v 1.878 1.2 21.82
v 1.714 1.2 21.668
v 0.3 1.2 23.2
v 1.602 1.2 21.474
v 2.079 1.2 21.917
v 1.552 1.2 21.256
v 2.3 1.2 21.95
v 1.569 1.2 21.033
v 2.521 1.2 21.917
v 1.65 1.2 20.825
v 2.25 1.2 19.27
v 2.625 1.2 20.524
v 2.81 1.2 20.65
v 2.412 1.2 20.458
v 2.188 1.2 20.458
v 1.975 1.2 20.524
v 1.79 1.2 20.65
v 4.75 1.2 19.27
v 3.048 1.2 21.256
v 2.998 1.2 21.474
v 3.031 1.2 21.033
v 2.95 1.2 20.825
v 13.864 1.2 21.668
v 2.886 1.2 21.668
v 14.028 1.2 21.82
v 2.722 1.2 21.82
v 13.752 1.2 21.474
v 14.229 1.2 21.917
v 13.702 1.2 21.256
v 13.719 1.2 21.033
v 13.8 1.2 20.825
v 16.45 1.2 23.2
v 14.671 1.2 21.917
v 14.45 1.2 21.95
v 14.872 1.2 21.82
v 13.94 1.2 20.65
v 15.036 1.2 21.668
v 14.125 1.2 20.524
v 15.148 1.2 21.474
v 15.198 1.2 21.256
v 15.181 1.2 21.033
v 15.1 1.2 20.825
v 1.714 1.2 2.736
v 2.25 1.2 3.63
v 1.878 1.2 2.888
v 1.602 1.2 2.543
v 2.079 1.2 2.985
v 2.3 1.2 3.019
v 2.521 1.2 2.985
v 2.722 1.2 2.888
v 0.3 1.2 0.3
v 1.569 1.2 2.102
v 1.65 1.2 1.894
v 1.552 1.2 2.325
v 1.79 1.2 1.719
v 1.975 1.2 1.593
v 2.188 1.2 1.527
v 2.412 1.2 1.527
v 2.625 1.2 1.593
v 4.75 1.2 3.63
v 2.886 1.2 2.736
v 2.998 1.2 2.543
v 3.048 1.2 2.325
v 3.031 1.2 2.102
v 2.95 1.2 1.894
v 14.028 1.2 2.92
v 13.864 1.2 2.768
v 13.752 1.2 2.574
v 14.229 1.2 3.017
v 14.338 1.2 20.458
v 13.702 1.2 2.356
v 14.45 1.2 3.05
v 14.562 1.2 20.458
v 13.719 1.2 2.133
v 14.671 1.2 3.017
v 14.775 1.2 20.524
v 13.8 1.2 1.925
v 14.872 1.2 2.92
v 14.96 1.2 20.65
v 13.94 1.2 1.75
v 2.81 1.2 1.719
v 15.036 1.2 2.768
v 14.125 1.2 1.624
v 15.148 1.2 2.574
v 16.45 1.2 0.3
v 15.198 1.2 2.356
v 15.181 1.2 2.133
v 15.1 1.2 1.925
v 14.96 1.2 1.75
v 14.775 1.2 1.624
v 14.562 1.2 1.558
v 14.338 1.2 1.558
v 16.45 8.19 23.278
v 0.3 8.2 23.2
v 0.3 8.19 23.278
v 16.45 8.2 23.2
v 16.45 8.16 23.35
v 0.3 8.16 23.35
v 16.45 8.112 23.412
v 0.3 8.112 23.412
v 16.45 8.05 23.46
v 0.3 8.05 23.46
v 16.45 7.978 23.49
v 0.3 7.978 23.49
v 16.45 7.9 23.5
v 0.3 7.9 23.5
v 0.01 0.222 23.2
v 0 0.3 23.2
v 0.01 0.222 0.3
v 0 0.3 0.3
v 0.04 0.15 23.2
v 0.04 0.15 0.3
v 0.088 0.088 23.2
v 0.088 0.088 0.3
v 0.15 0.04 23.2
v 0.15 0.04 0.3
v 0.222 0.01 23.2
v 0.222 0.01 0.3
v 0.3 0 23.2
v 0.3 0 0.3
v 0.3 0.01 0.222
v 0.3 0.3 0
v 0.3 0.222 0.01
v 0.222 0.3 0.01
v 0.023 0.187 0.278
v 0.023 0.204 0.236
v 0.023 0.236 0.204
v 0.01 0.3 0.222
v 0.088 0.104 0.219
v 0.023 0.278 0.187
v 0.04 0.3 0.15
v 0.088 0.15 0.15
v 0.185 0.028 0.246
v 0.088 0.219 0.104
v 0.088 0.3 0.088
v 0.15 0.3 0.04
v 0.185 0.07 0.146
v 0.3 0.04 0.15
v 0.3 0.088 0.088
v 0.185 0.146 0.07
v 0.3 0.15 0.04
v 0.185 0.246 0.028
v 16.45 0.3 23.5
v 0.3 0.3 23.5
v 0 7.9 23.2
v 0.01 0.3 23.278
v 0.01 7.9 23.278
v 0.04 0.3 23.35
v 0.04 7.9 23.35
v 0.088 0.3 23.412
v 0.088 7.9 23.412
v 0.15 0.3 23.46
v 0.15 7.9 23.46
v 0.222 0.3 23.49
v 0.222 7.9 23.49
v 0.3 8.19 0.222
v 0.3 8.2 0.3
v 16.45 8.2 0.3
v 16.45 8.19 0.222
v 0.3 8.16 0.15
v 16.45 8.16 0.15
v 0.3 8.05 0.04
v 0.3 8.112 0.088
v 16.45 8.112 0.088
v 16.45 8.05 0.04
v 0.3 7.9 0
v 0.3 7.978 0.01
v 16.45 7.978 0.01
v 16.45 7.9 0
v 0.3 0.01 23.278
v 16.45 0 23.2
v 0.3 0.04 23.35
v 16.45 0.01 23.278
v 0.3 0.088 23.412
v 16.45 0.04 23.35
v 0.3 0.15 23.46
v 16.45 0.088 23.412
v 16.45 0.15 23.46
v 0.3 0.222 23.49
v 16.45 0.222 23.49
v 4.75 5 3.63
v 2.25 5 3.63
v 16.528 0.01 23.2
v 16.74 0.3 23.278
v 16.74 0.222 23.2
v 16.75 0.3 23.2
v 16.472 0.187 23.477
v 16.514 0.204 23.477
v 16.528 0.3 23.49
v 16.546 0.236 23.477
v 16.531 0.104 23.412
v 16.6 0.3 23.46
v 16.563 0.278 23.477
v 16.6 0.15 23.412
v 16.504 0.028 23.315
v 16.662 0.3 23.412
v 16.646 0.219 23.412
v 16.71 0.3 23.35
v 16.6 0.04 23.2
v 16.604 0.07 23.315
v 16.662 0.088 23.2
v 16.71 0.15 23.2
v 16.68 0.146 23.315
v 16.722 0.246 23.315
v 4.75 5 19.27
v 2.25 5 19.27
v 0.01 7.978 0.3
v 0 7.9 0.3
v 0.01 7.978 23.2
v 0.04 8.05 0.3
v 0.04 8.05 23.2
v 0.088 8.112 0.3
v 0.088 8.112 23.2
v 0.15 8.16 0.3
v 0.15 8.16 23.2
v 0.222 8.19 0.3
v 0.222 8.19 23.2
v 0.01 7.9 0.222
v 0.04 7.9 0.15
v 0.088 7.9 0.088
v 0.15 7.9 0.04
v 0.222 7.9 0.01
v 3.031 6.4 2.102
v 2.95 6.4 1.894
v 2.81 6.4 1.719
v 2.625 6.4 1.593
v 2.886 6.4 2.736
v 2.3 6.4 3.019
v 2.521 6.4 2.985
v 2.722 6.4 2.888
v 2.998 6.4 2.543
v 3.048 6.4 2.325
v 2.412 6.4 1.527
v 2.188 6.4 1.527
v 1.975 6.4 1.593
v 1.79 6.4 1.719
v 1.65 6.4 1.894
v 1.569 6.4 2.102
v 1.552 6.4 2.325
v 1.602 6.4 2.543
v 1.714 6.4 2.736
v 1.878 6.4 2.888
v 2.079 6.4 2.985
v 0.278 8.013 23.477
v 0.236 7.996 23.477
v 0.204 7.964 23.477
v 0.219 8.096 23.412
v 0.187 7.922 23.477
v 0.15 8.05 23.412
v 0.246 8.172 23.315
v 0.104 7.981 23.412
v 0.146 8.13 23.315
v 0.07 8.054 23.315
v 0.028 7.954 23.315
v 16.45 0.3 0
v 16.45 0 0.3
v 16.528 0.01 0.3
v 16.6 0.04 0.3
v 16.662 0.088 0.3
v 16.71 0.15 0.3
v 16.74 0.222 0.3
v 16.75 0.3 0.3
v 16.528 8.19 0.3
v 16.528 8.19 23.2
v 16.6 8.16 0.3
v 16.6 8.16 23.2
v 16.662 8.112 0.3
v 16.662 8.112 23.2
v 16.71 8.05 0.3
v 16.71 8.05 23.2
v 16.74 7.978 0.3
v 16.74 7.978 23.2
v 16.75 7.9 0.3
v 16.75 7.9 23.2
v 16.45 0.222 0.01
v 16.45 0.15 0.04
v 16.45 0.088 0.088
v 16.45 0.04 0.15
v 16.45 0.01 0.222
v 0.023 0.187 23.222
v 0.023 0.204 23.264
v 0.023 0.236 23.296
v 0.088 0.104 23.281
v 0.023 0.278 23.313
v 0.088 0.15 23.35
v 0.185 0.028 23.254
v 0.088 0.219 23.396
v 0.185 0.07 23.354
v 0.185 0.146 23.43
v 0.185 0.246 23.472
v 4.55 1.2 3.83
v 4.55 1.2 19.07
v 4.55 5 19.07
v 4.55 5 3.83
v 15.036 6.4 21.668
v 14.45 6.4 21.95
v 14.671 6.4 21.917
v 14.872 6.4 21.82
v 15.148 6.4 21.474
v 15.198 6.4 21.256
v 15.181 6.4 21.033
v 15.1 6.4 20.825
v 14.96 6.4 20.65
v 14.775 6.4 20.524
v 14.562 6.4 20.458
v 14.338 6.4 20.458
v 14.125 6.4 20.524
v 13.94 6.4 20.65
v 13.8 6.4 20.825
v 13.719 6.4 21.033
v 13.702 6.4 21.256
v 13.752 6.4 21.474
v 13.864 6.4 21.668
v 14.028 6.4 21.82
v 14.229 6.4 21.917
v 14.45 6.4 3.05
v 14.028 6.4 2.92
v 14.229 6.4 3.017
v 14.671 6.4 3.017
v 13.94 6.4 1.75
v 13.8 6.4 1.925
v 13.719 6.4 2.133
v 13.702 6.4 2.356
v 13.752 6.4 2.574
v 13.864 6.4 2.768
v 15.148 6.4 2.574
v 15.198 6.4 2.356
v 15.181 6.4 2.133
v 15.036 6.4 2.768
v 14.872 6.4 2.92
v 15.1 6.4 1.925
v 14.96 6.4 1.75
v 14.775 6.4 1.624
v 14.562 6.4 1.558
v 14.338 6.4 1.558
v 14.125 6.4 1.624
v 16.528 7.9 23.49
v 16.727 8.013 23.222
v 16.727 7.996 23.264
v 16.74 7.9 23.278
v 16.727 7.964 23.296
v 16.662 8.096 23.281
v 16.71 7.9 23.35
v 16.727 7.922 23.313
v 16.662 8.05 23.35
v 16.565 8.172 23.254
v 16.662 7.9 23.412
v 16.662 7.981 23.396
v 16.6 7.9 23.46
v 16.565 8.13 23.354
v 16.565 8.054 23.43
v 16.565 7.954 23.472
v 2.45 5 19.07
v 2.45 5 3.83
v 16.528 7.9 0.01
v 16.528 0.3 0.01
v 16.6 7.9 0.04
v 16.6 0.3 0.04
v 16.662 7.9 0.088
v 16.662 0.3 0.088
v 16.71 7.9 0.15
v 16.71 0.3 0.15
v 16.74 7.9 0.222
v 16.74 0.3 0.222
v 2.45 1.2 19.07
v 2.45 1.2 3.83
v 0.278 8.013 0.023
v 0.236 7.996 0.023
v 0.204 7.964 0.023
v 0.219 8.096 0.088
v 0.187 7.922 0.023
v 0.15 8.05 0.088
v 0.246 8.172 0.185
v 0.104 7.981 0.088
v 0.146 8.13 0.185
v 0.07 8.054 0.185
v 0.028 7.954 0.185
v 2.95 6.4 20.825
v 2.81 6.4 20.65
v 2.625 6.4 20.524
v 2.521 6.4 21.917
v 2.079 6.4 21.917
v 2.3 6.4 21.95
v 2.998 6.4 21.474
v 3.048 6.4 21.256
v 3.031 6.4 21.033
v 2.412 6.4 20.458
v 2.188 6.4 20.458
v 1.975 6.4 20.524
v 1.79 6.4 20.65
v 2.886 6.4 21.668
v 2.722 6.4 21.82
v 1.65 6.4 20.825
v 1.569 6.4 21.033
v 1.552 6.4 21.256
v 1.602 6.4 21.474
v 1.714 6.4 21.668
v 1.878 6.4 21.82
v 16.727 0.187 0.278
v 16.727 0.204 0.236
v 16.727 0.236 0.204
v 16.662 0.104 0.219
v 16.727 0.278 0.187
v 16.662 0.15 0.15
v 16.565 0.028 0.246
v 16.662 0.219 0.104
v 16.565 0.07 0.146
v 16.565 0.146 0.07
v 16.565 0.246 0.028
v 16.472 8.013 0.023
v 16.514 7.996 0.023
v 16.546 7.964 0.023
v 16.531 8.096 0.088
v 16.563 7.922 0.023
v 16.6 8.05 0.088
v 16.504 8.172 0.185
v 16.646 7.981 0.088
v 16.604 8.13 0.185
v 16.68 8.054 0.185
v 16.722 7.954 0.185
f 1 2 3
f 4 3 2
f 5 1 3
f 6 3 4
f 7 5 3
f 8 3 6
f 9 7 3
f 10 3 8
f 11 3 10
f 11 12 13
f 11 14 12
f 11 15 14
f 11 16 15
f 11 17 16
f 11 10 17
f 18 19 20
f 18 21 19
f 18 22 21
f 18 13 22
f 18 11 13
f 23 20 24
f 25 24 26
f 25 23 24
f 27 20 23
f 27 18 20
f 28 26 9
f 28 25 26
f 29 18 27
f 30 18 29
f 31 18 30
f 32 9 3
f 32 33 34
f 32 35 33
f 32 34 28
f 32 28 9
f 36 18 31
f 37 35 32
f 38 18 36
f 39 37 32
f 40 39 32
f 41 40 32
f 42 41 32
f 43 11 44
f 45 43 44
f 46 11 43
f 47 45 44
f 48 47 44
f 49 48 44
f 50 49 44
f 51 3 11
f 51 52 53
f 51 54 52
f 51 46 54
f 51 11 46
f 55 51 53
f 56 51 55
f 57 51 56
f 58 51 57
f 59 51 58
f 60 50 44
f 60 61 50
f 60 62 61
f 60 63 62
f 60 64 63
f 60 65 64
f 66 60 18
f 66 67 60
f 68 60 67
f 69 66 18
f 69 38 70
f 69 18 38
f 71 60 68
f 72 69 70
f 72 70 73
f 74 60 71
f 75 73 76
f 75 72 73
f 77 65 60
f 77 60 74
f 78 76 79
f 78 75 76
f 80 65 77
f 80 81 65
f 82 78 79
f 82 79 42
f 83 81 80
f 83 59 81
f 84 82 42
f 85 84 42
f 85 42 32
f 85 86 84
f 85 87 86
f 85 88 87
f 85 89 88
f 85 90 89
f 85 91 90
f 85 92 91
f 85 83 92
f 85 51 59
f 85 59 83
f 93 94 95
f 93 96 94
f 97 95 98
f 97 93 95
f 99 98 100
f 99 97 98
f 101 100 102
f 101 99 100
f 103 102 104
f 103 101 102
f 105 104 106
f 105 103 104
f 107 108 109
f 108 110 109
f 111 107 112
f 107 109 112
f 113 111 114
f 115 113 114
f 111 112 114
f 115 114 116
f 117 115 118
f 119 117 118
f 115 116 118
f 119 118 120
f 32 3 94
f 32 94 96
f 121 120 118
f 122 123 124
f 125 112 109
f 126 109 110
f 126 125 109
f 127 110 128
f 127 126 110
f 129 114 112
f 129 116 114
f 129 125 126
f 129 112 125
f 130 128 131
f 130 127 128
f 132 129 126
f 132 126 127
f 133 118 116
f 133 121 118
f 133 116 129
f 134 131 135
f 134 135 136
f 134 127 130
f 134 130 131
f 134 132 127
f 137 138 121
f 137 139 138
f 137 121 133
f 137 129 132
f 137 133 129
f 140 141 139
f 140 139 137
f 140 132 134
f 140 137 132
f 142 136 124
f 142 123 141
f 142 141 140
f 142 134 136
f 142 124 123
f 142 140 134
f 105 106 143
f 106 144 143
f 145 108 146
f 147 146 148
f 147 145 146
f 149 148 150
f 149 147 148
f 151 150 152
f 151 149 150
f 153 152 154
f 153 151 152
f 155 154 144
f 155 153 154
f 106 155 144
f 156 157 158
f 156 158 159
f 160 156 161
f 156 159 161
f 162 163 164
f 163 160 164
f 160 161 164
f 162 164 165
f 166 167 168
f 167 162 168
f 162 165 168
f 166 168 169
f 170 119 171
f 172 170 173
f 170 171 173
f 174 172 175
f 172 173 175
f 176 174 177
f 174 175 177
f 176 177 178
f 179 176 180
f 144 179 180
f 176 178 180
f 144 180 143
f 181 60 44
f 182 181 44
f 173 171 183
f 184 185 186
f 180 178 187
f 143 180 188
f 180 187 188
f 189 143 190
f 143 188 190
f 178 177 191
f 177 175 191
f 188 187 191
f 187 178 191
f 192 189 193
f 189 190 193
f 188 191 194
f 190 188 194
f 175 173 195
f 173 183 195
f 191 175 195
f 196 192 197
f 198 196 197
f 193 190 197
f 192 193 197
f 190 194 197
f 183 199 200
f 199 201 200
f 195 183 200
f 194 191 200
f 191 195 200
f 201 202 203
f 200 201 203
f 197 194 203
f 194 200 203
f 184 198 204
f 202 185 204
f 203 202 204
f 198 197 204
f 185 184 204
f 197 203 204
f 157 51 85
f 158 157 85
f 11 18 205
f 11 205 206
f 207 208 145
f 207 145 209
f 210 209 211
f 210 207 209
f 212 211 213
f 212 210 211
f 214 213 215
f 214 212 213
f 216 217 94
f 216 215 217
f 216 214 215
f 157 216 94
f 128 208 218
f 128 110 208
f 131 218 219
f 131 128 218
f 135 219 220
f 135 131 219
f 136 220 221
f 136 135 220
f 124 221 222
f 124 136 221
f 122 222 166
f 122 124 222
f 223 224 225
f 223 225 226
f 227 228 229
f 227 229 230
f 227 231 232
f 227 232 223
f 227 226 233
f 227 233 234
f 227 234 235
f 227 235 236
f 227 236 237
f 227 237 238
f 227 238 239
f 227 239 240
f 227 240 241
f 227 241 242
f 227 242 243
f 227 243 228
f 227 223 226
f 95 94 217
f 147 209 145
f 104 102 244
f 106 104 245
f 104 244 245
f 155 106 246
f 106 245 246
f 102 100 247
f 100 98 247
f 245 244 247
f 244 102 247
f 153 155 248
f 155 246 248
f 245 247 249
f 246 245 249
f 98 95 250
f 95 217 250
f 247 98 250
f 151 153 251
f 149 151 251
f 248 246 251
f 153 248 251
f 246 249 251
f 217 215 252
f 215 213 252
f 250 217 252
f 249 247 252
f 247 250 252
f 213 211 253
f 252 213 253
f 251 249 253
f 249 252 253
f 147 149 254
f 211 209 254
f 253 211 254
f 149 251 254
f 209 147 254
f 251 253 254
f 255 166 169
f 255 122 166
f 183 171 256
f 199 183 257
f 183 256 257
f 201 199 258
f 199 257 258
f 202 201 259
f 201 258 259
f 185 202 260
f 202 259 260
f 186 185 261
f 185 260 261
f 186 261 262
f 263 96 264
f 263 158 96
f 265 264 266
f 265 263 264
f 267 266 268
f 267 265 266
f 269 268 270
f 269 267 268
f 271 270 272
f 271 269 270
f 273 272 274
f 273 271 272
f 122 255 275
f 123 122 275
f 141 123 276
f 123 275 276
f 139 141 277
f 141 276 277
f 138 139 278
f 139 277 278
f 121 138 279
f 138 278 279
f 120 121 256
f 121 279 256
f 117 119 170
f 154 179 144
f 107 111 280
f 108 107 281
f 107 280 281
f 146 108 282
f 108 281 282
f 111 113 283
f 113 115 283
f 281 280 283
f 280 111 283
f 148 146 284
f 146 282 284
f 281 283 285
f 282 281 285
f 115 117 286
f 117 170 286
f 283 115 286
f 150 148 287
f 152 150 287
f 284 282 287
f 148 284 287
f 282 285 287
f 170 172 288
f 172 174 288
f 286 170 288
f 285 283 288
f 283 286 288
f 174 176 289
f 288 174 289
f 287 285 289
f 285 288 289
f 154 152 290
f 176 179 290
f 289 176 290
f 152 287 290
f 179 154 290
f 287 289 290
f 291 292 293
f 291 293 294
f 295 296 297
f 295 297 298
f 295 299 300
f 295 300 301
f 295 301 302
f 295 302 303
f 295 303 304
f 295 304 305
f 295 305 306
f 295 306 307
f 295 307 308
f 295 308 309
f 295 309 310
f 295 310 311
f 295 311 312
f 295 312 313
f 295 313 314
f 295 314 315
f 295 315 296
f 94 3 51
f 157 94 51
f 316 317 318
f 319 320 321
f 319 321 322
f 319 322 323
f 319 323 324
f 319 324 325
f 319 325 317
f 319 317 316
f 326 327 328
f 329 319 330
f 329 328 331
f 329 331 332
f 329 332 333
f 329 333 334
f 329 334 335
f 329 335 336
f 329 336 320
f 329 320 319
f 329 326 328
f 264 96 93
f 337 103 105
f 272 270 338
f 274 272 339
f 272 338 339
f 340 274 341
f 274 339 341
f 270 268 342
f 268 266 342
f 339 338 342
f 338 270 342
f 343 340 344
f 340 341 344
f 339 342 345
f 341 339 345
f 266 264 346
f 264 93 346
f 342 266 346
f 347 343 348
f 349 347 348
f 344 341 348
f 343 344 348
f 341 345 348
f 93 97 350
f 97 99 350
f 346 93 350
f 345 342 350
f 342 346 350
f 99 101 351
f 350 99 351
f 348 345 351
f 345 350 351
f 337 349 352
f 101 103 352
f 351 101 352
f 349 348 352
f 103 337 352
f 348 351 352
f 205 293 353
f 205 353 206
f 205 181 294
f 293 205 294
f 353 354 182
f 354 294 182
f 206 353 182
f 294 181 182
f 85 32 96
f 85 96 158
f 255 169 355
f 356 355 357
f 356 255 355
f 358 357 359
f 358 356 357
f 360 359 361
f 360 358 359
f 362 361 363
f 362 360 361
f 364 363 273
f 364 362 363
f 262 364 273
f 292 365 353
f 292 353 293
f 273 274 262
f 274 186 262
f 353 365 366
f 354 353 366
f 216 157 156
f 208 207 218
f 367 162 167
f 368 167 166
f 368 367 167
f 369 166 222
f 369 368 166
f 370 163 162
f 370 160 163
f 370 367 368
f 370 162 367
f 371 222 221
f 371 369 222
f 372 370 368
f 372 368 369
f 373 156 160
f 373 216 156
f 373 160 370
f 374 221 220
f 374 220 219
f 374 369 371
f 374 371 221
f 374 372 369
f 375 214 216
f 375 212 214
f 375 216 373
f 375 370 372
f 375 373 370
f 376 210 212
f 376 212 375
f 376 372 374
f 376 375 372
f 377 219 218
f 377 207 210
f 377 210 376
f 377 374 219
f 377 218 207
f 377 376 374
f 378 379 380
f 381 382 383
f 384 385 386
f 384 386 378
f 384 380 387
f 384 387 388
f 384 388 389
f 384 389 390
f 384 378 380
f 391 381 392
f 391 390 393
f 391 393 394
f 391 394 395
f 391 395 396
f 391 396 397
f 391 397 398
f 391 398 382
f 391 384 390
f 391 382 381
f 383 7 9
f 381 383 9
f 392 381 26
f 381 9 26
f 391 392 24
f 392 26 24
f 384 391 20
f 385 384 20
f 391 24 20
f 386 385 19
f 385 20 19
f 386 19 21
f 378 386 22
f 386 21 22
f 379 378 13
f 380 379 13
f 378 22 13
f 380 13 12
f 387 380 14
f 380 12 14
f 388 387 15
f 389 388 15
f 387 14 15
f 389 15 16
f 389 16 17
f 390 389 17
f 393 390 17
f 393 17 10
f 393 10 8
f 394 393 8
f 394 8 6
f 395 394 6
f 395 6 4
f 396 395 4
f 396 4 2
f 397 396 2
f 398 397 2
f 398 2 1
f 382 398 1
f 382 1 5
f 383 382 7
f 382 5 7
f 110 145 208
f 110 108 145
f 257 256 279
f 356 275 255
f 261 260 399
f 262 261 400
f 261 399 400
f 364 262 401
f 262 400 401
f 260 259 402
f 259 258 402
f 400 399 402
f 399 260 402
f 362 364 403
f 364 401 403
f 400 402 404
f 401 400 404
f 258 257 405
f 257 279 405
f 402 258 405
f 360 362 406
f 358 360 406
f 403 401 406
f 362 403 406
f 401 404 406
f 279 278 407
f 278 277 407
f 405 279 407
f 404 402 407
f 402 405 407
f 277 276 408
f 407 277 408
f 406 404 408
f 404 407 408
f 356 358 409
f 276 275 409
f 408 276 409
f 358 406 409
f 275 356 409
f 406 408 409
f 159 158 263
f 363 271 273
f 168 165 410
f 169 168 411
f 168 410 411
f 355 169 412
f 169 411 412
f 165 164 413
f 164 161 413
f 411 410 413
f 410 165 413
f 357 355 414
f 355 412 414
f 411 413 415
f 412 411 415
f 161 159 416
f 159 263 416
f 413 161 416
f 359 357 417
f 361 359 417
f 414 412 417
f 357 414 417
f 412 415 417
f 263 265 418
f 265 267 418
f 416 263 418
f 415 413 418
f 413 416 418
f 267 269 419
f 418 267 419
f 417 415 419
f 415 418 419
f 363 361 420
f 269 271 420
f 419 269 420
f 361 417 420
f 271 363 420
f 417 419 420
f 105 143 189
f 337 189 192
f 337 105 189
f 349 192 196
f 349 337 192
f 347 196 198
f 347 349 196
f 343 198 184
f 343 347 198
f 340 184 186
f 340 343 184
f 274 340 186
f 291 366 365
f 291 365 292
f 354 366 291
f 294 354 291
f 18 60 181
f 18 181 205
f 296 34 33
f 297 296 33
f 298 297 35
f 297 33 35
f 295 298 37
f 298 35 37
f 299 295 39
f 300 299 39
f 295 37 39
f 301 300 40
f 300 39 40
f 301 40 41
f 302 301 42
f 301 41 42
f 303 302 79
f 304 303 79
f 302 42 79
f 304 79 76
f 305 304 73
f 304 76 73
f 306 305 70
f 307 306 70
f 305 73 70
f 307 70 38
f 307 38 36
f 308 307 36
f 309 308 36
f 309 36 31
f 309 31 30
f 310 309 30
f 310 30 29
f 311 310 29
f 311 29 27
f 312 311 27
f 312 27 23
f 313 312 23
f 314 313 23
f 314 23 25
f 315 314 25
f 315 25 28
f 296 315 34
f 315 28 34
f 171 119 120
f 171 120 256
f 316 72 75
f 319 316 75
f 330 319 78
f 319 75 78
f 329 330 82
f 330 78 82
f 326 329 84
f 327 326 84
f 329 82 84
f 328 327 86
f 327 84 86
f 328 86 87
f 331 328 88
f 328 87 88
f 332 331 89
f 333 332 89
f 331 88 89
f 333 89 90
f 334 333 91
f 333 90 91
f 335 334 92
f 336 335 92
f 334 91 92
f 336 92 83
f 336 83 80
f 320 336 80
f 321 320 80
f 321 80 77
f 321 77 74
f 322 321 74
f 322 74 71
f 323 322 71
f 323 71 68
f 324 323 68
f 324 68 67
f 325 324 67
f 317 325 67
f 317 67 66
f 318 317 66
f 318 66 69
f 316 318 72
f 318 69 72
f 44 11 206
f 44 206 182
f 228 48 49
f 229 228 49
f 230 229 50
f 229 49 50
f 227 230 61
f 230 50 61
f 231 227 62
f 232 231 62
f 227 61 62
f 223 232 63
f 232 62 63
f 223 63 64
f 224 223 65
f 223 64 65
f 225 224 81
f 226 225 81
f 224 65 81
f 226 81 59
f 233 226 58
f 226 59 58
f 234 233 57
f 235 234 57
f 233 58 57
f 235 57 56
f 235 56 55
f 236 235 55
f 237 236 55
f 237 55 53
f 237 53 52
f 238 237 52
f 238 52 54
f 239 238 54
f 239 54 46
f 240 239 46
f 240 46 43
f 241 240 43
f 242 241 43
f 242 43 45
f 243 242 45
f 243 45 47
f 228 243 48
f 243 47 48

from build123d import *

# Parameters (mm, degrees)
SKETCH1_W           = 16.75
SKETCH1_H           = 23.5
BOSS_EXTRUDE1_DEPTH = 1.2
SKETCH3_R           = 0.75
BOSS_EXTRUDE2_DEPTH = 5.2
SKETCH5_W           = 16.75
SKETCH5_H           = 23.5
SKETCH5_W_2         = 16.15
SKETCH5_H_2         = 22.9
BOSS_EXTRUDE3_DEPTH = 7
SKETCH7_W           = 2.1
SKETCH7_H           = 15.24
BOSS_EXTRUDE5_DEPTH = 3.8
FILLET4_R           = 0.3


with BuildPart() as part:
    # Sketch1 → Boss-Extrude1 (new body)
    with BuildSketch(Plane(origin=(0, 0, 0), x_dir=(1, 0, 0), z_dir=(0, 1, 0))):
        with Locations((8.375, -11.75)):
            Rectangle(SKETCH1_W, SKETCH1_H)
    extrude(amount=BOSS_EXTRUDE1_DEPTH)

    # Sketch3 → Boss-Extrude2 (add)
    with BuildSketch(Plane(origin=(0, 1.2, 0), x_dir=(1, 0, 0), z_dir=(0, 1, 0))):
        with Locations(Location((2.3, -2.268544265, 0), (0, 0, 270))):
            Circle(SKETCH3_R)
        with Locations(Location((2.3, -21.2, 0), (0, 0, 270))):
            Circle(SKETCH3_R)
        with Locations(Location((14.45, -21.2, 0), (0, 0, 270))):
            Circle(SKETCH3_R)
        with Locations(Location((14.45, -2.3, 0), (0, 0, 270))):
            Circle(SKETCH3_R)
    extrude(amount=BOSS_EXTRUDE2_DEPTH)

    # Sketch5 → Boss-Extrude3 (add)
    with BuildSketch(Plane(origin=(0, 1.2, 0), x_dir=(1, 0, 0), z_dir=(0, 1, 0))):
        with Locations((8.375, -11.75)):
            Rectangle(SKETCH5_W, SKETCH5_H)
        with Locations((8.375, -11.75)):
            Rectangle(SKETCH5_W_2, SKETCH5_H_2, mode=Mode.SUBTRACT)
    extrude(amount=BOSS_EXTRUDE3_DEPTH)

    # Sketch7 → Boss-Extrude5 (add)
    with BuildSketch(Plane(origin=(0, 1.2, 0), x_dir=(1, 0, 0), z_dir=(0, 1, 0))):
        Polygon((2.45, -3.63), (4.55, -3.63), (4.75, -3.63), (4.75, -19.27), (2.25, -19.27), (2.25, -3.63), align=None)
        with Locations((3.5, -11.45)):
            Rectangle(SKETCH7_W, SKETCH7_H, mode=Mode.SUBTRACT)
    extrude(amount=BOSS_EXTRUDE5_DEPTH)

    # Fillet4
    fillet4_edges = [part.edges().sort_by_distance(p)[0] for p in [
        (0, 8.2, 11.75),
        (8.375, 8.2, 23.5),
        (16.75, 8.2, 11.75),
        (8.375, 8.2, 0),
        (8.375, 0, 0),
        (16.75, 0, 11.75),
        (8.375, 0, 23.5),
        (0, 0, 11.75),
        (0, 4.1, 0),
        (16.75, 4.1, 0),
        (16.75, 4.1, 23.5),
        (0, 4.1, 23.5),
    ]]
    fillet(fillet4_edges, radius=FILLET4_R - 0.0001)  # a hair under: the kernel refuses the full size


solid = part.part
